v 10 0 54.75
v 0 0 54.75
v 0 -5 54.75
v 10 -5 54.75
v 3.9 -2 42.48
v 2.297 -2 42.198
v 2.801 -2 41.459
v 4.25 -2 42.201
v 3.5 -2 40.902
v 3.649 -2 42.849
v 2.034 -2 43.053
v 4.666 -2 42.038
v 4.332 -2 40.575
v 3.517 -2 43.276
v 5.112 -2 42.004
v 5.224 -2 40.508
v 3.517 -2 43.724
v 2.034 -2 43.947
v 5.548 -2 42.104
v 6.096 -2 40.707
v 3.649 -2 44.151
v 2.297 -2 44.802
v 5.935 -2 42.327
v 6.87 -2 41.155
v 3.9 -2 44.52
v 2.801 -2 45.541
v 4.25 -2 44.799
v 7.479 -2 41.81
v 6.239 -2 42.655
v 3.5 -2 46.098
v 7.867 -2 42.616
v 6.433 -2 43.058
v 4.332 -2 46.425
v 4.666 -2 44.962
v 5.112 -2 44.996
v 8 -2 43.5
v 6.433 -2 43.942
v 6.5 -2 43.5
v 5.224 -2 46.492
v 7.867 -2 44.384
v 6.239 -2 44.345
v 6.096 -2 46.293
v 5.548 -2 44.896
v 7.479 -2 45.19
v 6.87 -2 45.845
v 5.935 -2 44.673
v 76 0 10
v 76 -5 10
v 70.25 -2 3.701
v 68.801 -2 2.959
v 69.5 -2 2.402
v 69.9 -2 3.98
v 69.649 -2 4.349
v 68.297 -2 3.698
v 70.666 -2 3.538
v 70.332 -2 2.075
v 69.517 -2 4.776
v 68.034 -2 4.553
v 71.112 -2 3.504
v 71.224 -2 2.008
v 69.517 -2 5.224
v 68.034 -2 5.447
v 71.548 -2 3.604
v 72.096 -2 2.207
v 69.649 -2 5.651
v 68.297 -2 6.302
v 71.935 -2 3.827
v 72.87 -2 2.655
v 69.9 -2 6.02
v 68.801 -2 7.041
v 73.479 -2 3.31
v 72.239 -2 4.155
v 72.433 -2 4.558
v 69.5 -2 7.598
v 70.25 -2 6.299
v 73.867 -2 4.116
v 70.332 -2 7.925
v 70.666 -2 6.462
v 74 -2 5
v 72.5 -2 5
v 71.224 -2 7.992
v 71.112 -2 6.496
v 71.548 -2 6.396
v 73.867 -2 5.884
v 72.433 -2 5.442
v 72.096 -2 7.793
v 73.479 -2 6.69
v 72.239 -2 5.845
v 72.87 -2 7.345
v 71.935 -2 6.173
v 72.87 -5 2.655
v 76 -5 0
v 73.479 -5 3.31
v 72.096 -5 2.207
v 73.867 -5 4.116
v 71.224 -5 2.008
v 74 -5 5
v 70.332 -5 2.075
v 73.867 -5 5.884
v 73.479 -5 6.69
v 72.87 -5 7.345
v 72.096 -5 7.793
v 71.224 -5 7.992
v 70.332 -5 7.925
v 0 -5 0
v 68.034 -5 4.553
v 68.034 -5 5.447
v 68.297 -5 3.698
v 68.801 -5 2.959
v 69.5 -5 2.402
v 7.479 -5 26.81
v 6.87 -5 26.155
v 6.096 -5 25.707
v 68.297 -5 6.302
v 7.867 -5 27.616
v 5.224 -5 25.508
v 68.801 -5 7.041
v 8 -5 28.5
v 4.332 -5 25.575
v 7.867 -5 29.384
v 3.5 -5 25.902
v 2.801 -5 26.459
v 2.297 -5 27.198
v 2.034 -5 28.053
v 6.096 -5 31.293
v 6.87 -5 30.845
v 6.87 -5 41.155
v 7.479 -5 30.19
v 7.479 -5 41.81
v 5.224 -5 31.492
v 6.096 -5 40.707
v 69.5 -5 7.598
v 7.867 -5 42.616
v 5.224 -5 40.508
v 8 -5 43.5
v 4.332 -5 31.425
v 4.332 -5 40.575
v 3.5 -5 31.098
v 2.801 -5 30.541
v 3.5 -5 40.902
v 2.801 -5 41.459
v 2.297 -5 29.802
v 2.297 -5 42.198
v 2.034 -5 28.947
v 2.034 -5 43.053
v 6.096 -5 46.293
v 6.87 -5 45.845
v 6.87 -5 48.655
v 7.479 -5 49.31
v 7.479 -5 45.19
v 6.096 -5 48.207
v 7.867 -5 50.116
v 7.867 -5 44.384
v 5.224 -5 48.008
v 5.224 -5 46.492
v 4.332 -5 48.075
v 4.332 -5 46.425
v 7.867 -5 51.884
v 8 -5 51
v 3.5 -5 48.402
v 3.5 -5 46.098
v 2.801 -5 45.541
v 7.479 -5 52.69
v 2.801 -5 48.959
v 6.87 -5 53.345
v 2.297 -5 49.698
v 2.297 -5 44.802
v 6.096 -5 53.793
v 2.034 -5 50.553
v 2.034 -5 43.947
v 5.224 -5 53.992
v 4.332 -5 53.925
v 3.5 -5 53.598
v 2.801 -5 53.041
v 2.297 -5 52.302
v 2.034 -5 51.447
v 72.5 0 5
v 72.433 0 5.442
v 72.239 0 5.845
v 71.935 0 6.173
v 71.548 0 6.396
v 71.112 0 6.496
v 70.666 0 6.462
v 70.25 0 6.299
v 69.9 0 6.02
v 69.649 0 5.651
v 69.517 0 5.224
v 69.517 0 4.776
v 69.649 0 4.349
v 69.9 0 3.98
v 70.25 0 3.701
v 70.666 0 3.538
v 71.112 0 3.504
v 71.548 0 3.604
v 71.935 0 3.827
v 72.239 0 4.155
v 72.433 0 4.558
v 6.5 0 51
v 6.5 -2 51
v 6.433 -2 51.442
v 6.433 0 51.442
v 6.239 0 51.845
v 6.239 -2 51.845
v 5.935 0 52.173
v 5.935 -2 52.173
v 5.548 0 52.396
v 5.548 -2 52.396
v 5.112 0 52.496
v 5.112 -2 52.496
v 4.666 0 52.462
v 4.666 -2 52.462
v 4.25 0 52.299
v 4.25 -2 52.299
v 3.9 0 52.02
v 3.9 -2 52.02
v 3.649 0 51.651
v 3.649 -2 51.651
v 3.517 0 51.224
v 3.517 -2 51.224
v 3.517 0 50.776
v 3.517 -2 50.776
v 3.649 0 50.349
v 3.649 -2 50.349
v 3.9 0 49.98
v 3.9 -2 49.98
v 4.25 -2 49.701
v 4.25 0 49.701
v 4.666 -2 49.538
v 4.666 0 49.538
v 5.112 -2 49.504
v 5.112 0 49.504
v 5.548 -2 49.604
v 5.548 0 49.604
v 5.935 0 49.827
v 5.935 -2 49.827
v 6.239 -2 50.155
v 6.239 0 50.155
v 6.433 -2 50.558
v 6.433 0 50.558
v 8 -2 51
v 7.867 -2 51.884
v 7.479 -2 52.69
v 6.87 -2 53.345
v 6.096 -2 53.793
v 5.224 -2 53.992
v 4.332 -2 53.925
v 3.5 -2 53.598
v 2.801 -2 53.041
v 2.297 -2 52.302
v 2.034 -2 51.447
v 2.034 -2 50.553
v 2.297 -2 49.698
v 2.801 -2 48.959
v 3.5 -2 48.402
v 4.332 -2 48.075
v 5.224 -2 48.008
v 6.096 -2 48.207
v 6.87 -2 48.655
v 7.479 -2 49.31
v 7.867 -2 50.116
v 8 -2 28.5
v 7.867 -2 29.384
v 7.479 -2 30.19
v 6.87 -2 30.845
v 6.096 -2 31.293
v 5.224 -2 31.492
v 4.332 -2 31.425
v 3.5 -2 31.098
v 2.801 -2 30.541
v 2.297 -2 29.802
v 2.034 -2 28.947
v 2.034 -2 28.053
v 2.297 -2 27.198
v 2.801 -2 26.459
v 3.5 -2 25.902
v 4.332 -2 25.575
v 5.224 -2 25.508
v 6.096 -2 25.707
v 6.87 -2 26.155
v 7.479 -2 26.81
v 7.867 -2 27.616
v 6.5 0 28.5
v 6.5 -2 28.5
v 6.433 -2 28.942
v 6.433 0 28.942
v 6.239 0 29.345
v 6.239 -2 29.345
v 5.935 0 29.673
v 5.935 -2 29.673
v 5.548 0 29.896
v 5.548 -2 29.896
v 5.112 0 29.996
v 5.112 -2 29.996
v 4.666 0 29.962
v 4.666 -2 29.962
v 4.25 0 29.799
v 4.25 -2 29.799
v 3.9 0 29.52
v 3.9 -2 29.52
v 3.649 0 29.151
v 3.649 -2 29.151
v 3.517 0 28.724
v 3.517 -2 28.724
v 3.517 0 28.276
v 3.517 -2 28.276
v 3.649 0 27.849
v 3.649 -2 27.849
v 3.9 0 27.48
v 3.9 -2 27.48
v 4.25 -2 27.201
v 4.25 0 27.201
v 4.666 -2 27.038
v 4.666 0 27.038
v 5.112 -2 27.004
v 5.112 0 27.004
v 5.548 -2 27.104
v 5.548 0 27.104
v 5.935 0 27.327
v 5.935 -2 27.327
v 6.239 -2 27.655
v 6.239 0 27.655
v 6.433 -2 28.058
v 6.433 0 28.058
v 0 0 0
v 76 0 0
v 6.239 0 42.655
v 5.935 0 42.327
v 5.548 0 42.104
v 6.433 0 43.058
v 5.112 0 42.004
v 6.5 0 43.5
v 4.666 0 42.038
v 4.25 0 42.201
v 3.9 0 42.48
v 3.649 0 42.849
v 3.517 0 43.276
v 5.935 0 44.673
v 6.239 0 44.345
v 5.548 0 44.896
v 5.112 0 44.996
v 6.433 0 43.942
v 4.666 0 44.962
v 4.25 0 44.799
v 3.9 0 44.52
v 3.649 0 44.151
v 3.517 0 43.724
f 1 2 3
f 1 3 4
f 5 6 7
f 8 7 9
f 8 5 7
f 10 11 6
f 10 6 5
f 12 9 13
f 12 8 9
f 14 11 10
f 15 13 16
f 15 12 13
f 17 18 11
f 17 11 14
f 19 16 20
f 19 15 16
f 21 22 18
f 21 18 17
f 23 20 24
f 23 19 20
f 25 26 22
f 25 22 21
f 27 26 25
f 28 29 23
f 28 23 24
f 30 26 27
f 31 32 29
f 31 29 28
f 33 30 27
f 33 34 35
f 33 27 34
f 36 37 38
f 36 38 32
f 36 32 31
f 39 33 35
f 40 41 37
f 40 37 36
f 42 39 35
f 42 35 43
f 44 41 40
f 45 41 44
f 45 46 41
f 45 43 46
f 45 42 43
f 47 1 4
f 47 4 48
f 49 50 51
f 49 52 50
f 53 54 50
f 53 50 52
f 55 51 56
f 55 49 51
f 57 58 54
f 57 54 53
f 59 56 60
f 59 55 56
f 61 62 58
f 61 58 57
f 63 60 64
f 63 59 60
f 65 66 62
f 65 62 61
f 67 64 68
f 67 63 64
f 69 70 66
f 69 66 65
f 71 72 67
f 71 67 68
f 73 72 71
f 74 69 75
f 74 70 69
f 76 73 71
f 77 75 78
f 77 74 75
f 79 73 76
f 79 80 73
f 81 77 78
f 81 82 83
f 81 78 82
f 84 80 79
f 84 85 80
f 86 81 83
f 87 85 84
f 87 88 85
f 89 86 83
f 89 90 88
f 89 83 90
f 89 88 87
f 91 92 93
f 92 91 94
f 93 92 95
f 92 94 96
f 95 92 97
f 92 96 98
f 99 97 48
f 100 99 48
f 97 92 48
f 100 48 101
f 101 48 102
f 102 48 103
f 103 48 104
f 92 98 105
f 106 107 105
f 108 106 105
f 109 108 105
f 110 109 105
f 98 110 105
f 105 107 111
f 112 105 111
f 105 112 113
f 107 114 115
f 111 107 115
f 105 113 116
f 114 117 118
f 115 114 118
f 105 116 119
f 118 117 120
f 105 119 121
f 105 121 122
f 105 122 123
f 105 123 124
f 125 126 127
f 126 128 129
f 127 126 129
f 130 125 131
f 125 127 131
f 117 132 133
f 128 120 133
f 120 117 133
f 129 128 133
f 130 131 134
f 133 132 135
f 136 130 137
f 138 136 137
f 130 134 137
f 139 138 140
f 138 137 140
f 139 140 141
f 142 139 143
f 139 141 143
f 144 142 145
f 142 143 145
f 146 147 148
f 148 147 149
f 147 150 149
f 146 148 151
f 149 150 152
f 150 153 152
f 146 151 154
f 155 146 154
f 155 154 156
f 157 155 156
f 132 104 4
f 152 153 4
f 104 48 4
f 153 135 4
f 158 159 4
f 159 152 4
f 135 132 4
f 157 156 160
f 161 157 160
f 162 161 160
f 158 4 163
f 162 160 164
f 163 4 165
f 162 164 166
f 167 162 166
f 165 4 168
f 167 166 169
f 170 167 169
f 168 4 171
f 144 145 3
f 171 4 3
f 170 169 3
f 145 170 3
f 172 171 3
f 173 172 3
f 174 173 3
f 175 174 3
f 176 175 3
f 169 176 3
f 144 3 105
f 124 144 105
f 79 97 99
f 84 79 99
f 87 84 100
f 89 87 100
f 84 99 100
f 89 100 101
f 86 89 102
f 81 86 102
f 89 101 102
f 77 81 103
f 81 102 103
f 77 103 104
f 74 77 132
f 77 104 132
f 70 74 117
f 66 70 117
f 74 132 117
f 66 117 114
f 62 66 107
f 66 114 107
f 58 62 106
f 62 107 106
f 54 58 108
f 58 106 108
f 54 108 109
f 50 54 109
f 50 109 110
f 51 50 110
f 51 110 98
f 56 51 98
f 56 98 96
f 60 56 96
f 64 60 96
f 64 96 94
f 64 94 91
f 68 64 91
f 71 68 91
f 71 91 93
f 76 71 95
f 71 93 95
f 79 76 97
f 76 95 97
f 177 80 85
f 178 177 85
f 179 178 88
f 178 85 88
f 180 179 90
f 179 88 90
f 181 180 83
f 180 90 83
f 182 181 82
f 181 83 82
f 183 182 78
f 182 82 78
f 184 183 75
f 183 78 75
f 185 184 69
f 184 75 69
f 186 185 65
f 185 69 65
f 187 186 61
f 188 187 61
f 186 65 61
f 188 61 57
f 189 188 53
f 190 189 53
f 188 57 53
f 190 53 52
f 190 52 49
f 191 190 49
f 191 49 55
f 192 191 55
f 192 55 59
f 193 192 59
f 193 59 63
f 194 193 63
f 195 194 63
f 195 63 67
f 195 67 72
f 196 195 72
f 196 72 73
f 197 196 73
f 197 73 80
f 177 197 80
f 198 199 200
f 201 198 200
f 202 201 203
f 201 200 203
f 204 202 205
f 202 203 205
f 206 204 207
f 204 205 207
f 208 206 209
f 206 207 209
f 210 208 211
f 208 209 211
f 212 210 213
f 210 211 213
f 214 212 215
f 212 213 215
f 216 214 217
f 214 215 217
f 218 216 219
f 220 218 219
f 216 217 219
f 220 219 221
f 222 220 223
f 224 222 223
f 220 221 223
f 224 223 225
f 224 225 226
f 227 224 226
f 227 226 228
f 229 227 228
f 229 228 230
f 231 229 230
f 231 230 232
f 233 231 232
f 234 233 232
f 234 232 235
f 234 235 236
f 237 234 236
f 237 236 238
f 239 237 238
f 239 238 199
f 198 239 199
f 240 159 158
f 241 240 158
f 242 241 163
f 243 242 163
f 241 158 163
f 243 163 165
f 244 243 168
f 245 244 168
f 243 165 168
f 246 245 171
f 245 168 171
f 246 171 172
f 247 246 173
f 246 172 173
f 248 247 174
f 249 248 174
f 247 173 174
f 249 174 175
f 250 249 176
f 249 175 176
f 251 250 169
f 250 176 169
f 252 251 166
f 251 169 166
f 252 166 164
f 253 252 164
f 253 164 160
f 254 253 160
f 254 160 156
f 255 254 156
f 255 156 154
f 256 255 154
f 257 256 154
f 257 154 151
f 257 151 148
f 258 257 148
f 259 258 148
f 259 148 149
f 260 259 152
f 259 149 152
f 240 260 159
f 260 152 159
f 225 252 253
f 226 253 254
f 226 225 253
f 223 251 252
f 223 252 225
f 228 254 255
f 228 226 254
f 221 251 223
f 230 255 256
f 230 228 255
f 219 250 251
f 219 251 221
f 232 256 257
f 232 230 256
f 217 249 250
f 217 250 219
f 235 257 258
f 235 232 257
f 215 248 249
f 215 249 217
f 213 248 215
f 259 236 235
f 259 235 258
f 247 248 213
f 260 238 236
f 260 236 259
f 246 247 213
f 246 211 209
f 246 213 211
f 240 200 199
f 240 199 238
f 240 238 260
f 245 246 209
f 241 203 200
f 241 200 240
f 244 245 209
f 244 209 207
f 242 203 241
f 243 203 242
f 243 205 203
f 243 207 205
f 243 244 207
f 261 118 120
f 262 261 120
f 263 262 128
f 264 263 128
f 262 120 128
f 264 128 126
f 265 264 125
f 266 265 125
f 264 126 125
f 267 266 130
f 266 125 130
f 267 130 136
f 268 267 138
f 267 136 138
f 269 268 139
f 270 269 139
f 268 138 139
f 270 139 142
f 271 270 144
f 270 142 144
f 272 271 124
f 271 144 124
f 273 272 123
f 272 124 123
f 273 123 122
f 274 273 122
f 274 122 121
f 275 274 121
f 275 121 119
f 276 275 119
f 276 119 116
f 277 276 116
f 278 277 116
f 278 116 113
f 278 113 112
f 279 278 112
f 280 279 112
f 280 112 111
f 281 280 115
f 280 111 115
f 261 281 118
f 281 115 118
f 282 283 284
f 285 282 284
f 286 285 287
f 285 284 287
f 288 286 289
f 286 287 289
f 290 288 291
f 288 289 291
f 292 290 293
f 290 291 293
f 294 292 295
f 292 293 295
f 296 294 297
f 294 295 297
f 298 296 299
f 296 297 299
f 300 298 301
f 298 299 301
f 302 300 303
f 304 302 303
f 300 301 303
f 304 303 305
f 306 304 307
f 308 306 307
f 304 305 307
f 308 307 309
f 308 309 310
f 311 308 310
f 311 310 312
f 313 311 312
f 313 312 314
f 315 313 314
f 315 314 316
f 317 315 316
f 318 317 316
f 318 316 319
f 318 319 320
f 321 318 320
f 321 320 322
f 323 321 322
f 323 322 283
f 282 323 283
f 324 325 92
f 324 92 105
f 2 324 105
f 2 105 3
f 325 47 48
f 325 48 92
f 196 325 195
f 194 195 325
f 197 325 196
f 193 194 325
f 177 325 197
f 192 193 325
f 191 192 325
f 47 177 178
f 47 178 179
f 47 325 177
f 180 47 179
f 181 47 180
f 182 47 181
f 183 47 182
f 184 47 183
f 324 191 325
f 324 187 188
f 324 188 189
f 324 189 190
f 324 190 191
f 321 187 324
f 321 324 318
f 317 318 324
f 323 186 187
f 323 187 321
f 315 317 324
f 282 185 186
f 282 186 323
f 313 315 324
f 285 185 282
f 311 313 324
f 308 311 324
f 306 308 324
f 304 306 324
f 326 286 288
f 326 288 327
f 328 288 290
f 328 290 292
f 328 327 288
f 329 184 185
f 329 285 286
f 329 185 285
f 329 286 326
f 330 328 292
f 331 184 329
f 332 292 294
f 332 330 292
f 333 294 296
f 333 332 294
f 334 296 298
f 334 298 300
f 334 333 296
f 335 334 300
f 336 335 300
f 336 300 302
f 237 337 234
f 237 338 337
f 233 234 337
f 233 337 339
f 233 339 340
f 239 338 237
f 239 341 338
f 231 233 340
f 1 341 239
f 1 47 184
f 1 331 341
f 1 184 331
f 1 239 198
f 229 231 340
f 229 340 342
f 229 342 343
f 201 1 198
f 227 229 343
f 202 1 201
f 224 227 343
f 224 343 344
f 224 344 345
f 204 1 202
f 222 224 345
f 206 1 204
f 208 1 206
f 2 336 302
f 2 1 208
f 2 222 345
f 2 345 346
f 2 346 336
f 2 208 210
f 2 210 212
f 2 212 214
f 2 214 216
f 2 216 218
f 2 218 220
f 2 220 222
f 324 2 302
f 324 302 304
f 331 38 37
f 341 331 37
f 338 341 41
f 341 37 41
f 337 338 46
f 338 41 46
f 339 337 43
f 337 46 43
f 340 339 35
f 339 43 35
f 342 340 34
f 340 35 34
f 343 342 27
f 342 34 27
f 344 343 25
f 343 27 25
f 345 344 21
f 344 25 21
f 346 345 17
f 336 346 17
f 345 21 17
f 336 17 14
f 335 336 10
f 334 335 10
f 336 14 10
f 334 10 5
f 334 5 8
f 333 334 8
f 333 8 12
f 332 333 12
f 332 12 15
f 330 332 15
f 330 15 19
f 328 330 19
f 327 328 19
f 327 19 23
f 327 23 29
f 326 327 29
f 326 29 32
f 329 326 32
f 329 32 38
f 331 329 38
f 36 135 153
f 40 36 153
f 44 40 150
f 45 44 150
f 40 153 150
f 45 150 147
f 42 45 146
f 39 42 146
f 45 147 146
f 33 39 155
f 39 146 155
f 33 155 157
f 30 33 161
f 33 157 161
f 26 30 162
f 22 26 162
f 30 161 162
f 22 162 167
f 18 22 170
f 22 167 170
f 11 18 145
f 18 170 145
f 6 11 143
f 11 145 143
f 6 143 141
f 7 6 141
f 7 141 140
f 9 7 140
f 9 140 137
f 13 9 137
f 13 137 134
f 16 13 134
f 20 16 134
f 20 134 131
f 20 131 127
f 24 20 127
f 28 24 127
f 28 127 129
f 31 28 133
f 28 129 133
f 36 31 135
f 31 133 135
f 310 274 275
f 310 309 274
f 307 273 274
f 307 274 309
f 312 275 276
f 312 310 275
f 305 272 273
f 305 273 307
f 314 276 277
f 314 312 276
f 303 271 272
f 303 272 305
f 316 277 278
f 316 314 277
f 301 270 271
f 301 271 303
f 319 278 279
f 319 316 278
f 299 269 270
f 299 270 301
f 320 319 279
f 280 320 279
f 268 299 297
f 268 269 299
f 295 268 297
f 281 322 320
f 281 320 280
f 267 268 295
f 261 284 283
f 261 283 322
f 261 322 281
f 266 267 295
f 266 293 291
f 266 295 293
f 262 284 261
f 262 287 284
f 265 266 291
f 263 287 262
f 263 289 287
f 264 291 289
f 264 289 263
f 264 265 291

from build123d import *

# Parameters (mm, degrees)
PAD_DEPTH       = 5
SKETCH001_R     = 1.5
POCKET_DEPTH    = 5.001
SKETCH002_R     = 3
POCKET001_DEPTH = 3


with BuildPart() as part:
    # Sketch → Pad (new body)
    with BuildSketch(Plane.XZ):
        Polygon((0, 0), (0, 54.75), (10, 54.75), (76, 10), (76, 0), align=None)
    extrude(amount=PAD_DEPTH)

    # Sketch001 (on Face7 of Pad) → Pocket (cut, through all)
    with BuildSketch(Plane.XZ.offset(5)):
        with Locations((5, 51)):
            Circle(SKETCH001_R)
        with Locations((5, 43.5)):
            Circle(SKETCH001_R)
        with Locations((5, 28.5)):
            Circle(SKETCH001_R)
        with Locations((71, 5)):
            Circle(SKETCH001_R)
    extrude(amount=-POCKET_DEPTH, mode=Mode.SUBTRACT)

    # Sketch002 (on Face5 of Pocket) → Pocket001 (cut)
    with BuildSketch(Plane.XZ.offset(5)):
        with Locations((5, 51)):
            Circle(SKETCH002_R)
        with Locations((5, 43.5)):
            Circle(SKETCH002_R)
        with Locations((5, 28.5)):
            Circle(SKETCH002_R)
        with Locations((71, 5)):
            Circle(SKETCH002_R)
    extrude(amount=-POCKET001_DEPTH, mode=Mode.SUBTRACT)


solid = part.part
